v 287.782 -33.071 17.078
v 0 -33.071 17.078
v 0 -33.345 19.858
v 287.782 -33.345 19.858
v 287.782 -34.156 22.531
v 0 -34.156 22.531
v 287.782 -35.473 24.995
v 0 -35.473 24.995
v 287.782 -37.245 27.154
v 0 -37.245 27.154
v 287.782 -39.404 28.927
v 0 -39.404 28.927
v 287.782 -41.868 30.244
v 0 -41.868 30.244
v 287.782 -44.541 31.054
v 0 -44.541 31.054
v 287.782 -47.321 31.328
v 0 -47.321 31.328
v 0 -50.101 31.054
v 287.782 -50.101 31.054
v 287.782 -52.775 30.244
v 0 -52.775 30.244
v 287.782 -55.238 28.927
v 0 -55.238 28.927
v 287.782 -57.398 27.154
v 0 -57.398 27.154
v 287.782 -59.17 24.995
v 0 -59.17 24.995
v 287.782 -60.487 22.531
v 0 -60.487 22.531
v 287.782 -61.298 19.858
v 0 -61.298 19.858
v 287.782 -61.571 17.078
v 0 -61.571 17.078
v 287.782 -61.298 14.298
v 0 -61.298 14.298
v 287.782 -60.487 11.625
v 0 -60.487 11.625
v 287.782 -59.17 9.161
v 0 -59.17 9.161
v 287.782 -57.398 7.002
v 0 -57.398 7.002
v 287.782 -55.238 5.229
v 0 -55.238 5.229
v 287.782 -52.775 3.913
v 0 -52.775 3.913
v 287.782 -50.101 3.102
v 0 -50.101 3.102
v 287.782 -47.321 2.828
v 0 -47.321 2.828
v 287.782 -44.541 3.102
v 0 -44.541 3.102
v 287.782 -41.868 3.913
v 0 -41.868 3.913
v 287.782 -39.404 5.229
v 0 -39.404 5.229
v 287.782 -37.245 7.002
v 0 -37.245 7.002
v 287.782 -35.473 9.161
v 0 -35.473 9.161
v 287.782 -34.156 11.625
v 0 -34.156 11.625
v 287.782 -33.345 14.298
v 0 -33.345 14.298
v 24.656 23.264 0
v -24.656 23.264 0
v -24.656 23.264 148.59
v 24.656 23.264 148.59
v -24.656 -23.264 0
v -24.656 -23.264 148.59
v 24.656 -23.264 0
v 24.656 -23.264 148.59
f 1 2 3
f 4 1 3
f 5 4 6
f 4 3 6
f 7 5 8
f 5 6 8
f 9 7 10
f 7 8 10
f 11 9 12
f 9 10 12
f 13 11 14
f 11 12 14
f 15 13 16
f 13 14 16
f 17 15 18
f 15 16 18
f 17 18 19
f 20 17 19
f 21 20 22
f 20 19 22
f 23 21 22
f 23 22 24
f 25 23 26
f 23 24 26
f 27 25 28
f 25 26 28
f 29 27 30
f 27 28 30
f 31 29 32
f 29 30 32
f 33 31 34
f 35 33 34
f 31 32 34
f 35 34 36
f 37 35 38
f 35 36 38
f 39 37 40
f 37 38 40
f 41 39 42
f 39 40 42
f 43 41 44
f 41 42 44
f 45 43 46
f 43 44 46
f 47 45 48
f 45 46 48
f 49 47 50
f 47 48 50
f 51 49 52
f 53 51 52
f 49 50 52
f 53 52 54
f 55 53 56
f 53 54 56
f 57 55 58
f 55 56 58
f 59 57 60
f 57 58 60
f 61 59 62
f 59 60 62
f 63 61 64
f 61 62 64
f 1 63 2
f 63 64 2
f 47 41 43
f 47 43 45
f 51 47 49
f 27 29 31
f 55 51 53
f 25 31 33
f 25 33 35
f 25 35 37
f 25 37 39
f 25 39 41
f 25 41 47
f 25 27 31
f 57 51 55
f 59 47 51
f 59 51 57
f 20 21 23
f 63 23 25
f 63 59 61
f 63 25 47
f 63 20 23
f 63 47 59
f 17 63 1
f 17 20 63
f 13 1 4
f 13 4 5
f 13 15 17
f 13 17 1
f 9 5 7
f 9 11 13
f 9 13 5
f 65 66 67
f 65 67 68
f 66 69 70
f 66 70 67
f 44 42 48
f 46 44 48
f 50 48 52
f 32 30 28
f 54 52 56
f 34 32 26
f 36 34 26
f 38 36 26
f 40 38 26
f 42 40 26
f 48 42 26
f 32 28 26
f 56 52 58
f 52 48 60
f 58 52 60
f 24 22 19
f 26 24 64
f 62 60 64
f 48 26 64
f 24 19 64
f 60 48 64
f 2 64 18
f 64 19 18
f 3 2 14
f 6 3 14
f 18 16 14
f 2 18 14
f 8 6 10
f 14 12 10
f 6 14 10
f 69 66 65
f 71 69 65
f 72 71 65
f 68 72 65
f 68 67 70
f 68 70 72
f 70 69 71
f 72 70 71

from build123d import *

# Parameters (mm, degrees)
F0_W     = 49.312842
F0_H     = 46.528318
F1_DEPTH = 148.59
F2_R     = 14.250175
F3_DEPTH = 287.782


with BuildPart() as f1:
    # F0 (on Top) → F1 (new body)
    with BuildSketch(Plane.XY):
        Rectangle(F0_W, F0_H)
    extrude(amount=F1_DEPTH)


with BuildPart() as f3:
    # F2 (on Right) → F3 (new body)
    with BuildSketch(Plane.YZ):
        with Locations((-47.321323, 17.078064)):
            Circle(F2_R)
    extrude(amount=F3_DEPTH)


solid = Compound([f1.part, f3.part])
